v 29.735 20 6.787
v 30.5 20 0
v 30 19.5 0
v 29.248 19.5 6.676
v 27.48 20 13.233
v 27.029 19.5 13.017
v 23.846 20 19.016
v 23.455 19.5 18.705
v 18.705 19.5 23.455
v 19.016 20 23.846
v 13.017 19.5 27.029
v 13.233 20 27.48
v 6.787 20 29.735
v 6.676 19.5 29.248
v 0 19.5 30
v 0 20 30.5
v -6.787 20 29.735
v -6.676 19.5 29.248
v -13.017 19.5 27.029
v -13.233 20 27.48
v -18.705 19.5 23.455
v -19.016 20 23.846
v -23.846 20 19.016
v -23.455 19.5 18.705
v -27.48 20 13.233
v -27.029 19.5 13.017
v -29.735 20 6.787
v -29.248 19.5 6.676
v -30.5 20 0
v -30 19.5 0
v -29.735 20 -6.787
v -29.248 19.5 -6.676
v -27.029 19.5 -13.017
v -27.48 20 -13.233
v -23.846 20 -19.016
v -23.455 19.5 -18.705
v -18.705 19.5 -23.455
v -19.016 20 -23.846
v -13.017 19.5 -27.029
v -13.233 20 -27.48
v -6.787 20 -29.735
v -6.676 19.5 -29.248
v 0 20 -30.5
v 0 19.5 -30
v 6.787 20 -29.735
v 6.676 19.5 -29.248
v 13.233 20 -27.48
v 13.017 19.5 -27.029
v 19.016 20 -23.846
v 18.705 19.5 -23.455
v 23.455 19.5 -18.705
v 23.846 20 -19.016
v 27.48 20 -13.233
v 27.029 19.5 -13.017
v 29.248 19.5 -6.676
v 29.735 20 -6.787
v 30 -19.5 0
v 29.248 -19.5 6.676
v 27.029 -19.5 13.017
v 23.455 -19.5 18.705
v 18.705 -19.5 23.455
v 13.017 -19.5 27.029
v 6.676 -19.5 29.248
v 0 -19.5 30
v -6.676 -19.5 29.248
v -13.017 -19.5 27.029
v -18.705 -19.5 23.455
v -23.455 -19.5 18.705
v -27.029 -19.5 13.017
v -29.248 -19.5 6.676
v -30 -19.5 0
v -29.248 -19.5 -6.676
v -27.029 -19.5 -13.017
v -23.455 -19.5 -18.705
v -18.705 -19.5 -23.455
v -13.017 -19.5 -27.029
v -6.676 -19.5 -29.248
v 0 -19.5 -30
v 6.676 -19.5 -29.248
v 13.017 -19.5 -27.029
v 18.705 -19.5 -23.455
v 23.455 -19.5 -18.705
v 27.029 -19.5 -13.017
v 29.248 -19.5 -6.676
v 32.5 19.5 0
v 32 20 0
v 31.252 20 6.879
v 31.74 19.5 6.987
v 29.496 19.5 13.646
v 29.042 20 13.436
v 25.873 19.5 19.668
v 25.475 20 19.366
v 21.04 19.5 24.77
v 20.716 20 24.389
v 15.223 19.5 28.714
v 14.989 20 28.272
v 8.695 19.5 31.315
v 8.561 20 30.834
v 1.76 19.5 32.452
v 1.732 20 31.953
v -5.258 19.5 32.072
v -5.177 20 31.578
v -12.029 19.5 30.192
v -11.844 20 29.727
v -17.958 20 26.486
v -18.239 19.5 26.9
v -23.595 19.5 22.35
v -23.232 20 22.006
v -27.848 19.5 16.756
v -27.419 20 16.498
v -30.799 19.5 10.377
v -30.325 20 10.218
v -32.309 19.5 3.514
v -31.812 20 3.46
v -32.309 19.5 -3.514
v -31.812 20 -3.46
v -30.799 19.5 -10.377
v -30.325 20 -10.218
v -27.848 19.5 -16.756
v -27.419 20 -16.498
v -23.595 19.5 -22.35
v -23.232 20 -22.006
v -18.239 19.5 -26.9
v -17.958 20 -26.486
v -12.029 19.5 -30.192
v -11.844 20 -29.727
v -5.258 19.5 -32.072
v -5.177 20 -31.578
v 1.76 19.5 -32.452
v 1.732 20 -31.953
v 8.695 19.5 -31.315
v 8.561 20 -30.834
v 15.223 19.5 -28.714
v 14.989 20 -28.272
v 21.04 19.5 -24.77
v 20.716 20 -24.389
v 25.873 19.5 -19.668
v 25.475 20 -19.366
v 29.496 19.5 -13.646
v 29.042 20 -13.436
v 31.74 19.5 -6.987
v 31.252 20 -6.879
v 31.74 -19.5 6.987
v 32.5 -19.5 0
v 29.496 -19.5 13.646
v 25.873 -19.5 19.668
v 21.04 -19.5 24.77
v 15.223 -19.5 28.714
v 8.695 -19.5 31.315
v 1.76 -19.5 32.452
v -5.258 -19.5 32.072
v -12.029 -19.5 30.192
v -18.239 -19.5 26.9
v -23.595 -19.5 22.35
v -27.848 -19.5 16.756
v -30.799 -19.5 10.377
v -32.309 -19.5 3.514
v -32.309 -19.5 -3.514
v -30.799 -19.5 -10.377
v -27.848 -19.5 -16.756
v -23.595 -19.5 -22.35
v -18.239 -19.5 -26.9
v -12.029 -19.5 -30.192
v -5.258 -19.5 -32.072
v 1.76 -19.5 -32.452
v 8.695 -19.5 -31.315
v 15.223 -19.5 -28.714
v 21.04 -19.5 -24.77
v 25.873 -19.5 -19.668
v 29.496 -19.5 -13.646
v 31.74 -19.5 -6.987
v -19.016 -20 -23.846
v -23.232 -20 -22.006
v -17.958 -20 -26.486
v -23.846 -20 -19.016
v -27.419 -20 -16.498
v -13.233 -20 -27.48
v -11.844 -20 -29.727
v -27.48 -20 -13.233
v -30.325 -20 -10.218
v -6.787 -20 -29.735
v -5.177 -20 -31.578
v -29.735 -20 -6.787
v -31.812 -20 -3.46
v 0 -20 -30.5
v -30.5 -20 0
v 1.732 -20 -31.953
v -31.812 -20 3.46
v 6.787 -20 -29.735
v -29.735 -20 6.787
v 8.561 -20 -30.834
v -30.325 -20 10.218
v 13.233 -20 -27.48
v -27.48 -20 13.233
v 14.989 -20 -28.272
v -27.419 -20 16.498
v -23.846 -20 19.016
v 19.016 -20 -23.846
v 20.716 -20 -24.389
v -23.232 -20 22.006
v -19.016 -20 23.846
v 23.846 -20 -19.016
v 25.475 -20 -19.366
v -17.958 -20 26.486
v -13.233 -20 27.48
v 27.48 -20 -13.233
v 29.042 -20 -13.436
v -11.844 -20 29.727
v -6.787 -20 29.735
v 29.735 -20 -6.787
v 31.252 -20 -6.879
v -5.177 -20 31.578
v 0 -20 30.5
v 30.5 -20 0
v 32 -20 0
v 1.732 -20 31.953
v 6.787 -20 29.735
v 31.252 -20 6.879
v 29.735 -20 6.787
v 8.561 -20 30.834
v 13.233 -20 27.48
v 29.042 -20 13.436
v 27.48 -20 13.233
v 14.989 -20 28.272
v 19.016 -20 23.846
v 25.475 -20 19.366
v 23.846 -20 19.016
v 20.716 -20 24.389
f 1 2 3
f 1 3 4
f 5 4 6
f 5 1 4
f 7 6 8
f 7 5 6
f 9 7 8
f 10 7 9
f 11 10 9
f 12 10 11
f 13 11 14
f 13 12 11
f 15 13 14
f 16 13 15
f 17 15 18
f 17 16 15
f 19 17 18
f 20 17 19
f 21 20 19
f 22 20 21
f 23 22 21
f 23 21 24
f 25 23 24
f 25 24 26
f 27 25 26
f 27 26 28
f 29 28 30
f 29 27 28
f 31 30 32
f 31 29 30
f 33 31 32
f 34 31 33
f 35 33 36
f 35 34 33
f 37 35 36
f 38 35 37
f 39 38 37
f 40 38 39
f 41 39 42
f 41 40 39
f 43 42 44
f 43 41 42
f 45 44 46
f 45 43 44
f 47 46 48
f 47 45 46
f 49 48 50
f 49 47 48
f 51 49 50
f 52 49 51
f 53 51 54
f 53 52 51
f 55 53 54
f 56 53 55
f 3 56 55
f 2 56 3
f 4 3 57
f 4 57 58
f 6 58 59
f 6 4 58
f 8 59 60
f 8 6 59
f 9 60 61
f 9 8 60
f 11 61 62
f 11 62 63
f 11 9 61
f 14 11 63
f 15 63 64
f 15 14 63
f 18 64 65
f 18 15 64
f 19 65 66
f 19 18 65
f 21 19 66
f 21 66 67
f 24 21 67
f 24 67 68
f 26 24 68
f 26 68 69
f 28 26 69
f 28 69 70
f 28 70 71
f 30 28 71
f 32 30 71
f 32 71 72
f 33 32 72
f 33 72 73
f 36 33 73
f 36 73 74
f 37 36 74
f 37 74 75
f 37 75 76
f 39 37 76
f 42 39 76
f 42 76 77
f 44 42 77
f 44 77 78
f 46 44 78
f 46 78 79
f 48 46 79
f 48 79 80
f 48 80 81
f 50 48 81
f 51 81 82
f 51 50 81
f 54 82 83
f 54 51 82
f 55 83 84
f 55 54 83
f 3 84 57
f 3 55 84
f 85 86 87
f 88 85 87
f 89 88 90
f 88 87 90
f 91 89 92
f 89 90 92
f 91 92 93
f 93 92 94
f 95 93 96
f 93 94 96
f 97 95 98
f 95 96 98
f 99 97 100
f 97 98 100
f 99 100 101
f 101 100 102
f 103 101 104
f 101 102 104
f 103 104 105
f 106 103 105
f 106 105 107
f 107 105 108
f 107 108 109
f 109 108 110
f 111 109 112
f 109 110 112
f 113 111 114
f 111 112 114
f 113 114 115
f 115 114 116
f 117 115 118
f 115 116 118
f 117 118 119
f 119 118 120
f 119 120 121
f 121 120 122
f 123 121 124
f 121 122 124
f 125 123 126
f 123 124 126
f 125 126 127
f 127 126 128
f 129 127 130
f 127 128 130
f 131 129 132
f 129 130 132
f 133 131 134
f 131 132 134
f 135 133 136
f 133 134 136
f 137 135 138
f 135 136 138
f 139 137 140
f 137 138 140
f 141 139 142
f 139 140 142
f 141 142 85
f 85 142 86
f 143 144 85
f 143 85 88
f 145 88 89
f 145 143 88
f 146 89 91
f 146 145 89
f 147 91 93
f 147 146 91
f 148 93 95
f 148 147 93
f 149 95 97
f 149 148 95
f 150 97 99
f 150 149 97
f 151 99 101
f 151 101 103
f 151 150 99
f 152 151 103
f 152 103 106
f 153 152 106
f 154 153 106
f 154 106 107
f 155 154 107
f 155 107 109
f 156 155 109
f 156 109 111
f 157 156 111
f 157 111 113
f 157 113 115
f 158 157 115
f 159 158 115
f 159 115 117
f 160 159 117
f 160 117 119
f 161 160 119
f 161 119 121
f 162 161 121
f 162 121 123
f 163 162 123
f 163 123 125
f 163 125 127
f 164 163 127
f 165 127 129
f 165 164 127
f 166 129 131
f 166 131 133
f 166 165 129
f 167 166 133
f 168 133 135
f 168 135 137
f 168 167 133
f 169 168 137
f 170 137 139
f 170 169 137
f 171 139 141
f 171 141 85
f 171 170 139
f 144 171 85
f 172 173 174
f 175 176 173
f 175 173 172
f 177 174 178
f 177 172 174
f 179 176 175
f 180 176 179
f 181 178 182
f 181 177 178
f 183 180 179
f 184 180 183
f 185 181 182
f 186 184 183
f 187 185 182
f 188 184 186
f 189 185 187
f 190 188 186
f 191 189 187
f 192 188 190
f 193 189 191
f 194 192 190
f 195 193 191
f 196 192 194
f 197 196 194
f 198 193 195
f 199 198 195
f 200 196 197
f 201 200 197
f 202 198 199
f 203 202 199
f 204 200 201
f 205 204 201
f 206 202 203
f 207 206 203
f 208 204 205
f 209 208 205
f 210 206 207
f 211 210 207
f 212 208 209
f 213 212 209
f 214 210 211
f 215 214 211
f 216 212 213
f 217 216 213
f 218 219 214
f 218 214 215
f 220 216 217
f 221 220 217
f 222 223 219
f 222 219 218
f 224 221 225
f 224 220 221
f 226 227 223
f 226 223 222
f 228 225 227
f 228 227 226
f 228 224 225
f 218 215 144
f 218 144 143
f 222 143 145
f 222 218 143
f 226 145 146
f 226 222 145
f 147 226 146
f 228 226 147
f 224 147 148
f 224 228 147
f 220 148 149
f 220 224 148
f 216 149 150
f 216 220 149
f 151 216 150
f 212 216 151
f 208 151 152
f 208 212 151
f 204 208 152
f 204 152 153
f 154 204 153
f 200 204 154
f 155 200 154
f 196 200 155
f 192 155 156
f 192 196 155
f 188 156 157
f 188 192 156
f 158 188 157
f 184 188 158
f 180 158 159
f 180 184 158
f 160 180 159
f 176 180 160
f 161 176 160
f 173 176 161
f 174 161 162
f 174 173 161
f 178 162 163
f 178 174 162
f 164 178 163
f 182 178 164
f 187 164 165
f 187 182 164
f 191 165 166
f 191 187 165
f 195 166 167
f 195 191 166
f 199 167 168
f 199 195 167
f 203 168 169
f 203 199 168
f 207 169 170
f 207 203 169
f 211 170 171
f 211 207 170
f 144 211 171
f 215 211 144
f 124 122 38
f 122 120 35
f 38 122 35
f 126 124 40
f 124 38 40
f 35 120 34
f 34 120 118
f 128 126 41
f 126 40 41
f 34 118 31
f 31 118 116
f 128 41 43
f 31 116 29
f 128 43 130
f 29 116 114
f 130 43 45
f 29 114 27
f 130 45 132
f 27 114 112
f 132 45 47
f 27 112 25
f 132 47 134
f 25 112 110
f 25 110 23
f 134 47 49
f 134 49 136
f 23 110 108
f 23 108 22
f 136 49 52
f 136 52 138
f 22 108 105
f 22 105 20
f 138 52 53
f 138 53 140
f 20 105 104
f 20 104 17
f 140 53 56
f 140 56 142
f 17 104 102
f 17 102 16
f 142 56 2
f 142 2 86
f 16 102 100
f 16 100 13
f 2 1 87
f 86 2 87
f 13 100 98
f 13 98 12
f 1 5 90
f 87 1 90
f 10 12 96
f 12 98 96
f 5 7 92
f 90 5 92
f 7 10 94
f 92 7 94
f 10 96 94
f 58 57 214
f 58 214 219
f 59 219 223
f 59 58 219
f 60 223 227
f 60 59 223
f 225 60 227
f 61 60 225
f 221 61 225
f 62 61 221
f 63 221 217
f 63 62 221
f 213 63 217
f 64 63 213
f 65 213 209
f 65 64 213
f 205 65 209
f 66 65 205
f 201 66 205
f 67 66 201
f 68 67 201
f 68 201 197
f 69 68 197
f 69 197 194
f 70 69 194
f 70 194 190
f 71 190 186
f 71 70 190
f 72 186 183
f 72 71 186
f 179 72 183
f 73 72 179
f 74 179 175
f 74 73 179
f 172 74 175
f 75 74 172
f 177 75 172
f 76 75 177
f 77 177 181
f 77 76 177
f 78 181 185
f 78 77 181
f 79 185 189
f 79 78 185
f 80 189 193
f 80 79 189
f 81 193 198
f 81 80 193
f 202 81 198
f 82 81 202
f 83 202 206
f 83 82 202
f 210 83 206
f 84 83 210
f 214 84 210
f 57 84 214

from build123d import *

# Parameters (mm, degrees)
F0_R     = 32.5
F0_R_2   = 30
F1_DEPTH = 20
F2_SIZE  = 0.5


with BuildPart() as f1:
    # F0 (on Front) → F1 (new body, symmetric)
    with BuildSketch(Plane.XZ):
        Circle(F0_R)
        Circle(F0_R_2, mode=Mode.SUBTRACT)
    extrude(amount=F1_DEPTH, both=True)

    # F2
    f2_edges = [f1.edges().sort_by_distance(p)[0] for p in [
        (-30, -20, 0),
        (30, 0, 0),
        (-30, 20, 0),
        (-32.5, 20, 0),
        (32.5, 0, 0),
        (-32.5, -20, 0),
    ]]
    chamfer(f2_edges, length=F2_SIZE)


solid = f1.part
